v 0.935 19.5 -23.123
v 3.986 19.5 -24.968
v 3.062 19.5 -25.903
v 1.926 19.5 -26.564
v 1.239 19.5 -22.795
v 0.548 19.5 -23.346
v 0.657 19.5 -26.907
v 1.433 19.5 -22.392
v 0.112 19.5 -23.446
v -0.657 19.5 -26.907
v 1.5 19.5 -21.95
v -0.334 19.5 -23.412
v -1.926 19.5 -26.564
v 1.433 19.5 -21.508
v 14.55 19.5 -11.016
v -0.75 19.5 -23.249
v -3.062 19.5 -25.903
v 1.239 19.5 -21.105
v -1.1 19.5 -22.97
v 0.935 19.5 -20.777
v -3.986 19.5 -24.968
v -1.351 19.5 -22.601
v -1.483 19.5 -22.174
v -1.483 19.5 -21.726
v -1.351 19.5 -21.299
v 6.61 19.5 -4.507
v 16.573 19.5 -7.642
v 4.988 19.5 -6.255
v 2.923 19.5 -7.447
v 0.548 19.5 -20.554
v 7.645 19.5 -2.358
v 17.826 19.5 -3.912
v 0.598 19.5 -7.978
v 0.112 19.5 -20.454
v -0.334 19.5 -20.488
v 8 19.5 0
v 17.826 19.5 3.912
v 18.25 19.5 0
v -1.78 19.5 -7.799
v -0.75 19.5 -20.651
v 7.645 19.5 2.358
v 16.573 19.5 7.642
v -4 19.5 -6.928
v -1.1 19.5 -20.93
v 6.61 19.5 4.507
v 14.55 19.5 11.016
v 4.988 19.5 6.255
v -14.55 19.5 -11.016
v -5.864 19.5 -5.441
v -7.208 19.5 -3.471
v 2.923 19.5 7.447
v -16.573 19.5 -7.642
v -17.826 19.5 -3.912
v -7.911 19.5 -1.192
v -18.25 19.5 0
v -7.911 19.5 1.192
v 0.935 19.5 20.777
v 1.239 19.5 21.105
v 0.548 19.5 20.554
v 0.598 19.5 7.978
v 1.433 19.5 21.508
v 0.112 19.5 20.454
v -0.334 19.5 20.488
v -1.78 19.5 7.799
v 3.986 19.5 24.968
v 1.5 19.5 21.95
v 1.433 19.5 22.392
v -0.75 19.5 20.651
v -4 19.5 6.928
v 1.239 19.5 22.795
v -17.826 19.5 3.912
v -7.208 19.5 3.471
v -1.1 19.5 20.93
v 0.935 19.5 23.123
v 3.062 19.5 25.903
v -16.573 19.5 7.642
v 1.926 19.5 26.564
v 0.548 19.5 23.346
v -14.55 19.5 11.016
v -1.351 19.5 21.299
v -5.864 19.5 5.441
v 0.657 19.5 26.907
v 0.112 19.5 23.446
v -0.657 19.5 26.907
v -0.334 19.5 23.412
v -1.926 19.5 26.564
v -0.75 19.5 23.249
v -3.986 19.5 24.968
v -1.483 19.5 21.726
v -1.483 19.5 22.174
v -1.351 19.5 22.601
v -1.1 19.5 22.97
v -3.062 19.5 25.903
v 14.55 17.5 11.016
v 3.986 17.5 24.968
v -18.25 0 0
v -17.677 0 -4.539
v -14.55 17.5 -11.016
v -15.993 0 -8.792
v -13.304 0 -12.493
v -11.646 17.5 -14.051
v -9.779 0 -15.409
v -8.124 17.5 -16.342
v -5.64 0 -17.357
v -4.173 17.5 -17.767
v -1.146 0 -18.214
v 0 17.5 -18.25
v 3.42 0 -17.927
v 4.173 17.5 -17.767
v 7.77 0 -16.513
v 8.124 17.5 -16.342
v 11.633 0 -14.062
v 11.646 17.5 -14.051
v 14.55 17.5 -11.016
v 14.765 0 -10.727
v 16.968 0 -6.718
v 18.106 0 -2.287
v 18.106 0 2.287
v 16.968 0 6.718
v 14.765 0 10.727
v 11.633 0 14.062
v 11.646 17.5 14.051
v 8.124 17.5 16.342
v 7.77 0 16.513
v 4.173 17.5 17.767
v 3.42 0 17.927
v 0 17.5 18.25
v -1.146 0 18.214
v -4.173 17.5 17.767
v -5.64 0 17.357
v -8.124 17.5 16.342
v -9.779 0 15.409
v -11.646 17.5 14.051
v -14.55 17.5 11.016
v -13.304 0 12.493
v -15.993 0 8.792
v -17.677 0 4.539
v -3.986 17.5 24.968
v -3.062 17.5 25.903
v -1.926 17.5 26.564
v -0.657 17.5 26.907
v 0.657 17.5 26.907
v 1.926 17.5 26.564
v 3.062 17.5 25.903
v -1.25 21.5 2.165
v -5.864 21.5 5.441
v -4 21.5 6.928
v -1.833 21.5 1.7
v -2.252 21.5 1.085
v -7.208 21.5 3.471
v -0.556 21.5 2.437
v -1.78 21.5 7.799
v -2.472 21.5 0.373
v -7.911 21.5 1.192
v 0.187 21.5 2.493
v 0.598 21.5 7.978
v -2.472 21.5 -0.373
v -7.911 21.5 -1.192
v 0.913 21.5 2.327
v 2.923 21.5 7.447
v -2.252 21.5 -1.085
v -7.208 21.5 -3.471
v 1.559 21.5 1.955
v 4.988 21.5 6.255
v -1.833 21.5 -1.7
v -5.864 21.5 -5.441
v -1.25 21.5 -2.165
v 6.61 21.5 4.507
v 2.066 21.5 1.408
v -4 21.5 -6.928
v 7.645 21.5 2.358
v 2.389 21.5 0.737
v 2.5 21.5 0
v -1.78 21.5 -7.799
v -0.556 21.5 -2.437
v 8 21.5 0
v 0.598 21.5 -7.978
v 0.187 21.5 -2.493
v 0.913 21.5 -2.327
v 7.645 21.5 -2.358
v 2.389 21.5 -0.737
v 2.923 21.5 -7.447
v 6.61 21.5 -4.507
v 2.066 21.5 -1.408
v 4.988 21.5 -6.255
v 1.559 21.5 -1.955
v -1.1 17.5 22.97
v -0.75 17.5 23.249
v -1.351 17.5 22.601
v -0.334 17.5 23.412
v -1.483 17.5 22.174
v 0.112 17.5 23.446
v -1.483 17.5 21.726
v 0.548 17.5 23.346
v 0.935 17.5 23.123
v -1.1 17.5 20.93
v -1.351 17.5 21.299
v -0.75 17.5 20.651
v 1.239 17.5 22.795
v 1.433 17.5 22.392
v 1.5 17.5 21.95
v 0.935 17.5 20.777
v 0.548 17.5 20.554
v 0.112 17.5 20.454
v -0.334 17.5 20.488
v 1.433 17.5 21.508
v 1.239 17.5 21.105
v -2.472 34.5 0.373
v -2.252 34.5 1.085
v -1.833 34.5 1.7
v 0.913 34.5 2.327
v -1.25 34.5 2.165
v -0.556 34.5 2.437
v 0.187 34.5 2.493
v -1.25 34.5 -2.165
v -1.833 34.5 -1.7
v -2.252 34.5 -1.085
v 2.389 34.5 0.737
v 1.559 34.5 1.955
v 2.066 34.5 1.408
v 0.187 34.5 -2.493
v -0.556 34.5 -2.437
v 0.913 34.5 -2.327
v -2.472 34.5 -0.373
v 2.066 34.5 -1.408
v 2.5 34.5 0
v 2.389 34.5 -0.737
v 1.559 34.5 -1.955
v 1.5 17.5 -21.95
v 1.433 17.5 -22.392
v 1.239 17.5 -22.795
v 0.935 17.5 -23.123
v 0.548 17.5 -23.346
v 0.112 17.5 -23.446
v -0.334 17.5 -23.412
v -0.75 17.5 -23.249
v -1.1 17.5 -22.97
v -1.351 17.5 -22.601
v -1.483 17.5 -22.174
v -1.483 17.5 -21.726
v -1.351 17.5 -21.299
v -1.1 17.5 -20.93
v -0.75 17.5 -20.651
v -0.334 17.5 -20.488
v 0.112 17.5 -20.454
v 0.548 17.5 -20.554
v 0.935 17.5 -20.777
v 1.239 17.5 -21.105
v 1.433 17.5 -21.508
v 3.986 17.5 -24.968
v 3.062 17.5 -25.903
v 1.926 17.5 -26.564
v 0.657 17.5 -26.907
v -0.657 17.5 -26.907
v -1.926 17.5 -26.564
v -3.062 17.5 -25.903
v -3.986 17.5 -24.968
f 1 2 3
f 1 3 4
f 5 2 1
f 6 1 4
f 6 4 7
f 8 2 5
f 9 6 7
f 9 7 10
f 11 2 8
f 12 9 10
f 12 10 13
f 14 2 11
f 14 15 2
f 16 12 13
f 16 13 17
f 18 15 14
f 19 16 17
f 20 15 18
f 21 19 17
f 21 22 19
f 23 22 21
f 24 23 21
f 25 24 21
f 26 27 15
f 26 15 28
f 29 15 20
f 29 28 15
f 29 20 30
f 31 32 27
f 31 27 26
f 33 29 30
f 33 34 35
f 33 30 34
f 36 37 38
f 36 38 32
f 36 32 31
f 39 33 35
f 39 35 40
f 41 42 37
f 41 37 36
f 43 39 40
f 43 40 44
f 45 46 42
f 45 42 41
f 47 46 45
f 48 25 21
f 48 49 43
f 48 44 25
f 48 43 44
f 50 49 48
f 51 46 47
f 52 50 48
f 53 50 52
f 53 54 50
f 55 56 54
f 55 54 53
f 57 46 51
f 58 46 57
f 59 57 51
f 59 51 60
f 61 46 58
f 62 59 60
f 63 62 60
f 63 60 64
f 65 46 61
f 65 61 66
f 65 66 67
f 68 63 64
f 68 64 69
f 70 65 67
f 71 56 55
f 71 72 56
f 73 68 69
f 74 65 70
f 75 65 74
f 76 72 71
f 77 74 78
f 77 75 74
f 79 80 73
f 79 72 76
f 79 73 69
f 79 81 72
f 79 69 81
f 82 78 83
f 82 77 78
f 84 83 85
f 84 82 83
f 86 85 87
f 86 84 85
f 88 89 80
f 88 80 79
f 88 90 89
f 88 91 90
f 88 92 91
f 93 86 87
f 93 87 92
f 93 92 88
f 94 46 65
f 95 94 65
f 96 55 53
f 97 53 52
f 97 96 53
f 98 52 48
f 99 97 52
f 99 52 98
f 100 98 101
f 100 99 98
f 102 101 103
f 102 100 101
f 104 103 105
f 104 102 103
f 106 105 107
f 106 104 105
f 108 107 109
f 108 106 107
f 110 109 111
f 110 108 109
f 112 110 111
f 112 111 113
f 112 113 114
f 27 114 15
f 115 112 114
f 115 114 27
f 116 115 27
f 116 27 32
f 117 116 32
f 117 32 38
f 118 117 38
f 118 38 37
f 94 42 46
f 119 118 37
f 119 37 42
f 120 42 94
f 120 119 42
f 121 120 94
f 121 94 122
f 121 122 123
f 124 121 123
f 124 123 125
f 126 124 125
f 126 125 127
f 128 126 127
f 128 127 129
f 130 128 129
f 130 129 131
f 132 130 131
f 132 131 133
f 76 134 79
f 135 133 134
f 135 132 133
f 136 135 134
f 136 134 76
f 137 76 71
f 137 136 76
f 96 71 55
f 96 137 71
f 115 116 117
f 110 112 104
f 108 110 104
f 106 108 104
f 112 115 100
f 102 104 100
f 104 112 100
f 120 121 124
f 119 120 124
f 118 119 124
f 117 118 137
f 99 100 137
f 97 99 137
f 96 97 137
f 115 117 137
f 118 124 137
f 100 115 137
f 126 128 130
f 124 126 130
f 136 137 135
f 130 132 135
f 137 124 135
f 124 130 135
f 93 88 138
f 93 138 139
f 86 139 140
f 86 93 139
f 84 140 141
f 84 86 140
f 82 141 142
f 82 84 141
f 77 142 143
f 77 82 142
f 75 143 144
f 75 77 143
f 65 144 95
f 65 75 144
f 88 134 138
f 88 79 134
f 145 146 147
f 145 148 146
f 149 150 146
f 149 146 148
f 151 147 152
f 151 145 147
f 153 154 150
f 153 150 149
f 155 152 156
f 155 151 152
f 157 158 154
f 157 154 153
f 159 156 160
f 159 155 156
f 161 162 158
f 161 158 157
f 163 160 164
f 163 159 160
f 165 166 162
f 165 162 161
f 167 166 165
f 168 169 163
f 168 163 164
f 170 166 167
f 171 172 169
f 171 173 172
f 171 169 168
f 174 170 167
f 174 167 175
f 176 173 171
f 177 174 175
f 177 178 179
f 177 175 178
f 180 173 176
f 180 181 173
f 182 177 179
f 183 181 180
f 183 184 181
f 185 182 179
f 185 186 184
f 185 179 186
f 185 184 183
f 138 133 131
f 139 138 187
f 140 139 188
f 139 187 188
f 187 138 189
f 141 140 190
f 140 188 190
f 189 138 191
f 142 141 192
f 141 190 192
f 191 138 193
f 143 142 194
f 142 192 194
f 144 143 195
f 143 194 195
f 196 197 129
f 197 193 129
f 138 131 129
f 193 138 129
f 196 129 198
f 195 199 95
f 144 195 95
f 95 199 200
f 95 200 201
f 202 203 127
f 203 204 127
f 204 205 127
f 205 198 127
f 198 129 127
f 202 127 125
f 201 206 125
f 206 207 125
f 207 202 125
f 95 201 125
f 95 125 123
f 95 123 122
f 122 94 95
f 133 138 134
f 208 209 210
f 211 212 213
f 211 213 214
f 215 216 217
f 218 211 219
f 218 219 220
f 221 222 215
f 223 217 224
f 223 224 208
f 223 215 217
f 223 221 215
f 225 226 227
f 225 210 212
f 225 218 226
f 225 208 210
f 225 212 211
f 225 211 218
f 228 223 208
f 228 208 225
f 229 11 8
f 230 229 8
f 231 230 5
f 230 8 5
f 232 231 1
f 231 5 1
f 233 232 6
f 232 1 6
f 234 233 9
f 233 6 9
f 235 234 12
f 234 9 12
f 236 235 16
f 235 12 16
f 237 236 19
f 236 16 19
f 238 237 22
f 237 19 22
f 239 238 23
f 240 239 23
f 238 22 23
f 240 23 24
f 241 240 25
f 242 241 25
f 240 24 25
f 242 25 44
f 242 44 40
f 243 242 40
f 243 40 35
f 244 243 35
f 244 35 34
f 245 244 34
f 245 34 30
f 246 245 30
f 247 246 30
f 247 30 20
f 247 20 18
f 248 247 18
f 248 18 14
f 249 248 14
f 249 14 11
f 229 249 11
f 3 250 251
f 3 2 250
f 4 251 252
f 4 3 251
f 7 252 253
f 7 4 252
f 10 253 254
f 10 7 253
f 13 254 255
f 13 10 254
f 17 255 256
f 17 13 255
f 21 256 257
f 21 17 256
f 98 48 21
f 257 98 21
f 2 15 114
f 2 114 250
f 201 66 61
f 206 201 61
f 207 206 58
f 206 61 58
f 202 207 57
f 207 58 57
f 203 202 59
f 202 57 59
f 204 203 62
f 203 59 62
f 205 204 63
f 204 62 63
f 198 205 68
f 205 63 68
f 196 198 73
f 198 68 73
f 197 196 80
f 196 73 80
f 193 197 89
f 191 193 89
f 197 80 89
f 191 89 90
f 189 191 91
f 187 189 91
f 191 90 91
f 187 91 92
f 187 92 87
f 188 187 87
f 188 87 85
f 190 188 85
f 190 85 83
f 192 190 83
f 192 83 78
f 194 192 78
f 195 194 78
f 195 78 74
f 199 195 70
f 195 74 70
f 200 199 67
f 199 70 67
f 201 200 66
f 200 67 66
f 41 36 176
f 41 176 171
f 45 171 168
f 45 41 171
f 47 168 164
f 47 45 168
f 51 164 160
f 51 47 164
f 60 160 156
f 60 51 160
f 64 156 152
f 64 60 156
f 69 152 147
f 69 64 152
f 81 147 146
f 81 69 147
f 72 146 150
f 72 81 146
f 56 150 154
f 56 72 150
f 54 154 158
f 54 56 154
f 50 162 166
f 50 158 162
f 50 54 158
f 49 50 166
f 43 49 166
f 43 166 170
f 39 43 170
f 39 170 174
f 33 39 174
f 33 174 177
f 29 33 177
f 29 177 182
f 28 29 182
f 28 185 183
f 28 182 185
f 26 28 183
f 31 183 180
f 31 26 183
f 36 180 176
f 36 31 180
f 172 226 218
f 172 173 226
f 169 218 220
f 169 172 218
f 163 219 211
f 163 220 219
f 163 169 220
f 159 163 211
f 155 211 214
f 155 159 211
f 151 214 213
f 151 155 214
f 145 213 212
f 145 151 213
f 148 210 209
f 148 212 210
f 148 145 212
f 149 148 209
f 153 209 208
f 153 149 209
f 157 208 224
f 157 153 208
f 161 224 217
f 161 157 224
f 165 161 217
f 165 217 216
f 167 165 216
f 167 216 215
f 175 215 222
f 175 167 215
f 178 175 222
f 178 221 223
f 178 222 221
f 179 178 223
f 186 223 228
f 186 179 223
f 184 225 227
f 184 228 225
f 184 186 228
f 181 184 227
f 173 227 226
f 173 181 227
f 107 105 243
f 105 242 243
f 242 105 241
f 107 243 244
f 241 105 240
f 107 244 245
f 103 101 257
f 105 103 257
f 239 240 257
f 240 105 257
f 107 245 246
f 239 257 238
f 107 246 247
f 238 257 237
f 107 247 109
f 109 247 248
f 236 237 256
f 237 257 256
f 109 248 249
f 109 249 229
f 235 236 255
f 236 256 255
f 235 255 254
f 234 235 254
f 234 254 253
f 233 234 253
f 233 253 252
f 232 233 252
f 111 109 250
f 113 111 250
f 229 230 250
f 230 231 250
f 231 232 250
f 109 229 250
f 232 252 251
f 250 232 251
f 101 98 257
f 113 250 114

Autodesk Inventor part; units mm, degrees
ref_plane "YZ Plane" through (0, 0, 0) normal (1, 0, 0) x (0, 1, 0)
ref_plane "XZ Plane" through (0, 0, 0) normal (0, 1, 0) x (-1, 0, 0)
ref_plane "XY Plane" through (0, 0, 0) normal (0, 0, 1) x (1, 0, 0)
sketch "Sketch1" plane through (0, 0, 0) normal (0, 1, 0) x (-1, 0, 0)
  circle A0 centre (0, 0) radius 18.25
  dimension "d0" = 36.5
extrude "Extrusion1" add sketch "Sketch1" along normal blind 19.5
sketch "Sketch2" plane through (0, 19.5, 0) normal (0, 1, 0) x (1, 0, 0)
  circle A0 centre (0, 0) radius 8
  dimension "d3" = 16
extrude "Extrusion2" add sketch "Sketch2" along normal blind 2
sketch "Sketch3" plane through (0, 19.5, 0) normal (0, 1, 0) x (1, 0, 0)
  circle A0 centre (0, 21.95) radius 1.5
  circle A1 centre (0, -21.95) radius 1.5
  arc A2 (3.9863, 24.9682) -> (-3.9863, 24.9682) centre (0, 21.95) ccw
  circle A3 centre (0, 0) radius 8
  line L0 (-14.5499, -11.0165) -> (-3.9863, -24.9682)
  line L1 (-14.5499, 11.0165) -> (-3.9863, 24.9682)
  line L2 (14.5499, -11.0165) -> (3.9863, -24.9682)
  line L3 (14.5499, 11.0165) -> (3.9863, 24.9682)
  arc A4 (-14.5499, -11.0165) -> (14.5499, -11.0165) centre (0, 0) ccw
  arc A5 (3.0557, 17.9924) -> (-3.0557, 17.9924) centre (0, 0) ccw
  arc A6 (-3.9863, -24.9682) -> (3.9863, -24.9682) centre (0, -21.95) ccw
  arc A7 (3.0557, -17.9924) -> (-3.0557, -17.9924) centre (0, -21.95) ccw
  arc A8 (-14.5499, -11.0165) -> (14.5499, -11.0165) centre (0, 0) ccw
  arc A9 (14.5499, 11.0165) -> (-14.5499, 11.0165) centre (0, 0) ccw
extrude "Extrusion3" add sketch "Sketch3" against normal blind 2 contours L3 A9 A5 L1 A2 | A4 L2 A6 L0
sketch "Sketch4" plane through (0, 21.5, 0) normal (0, 1, 0) x (1, 0, 0)
  circle A0 centre (0, 0) radius 2.5
  dimension "d12" = 5
extrude "Extrusion4" add sketch "Sketch4" along normal blind 13
properties part number "14HM08"
